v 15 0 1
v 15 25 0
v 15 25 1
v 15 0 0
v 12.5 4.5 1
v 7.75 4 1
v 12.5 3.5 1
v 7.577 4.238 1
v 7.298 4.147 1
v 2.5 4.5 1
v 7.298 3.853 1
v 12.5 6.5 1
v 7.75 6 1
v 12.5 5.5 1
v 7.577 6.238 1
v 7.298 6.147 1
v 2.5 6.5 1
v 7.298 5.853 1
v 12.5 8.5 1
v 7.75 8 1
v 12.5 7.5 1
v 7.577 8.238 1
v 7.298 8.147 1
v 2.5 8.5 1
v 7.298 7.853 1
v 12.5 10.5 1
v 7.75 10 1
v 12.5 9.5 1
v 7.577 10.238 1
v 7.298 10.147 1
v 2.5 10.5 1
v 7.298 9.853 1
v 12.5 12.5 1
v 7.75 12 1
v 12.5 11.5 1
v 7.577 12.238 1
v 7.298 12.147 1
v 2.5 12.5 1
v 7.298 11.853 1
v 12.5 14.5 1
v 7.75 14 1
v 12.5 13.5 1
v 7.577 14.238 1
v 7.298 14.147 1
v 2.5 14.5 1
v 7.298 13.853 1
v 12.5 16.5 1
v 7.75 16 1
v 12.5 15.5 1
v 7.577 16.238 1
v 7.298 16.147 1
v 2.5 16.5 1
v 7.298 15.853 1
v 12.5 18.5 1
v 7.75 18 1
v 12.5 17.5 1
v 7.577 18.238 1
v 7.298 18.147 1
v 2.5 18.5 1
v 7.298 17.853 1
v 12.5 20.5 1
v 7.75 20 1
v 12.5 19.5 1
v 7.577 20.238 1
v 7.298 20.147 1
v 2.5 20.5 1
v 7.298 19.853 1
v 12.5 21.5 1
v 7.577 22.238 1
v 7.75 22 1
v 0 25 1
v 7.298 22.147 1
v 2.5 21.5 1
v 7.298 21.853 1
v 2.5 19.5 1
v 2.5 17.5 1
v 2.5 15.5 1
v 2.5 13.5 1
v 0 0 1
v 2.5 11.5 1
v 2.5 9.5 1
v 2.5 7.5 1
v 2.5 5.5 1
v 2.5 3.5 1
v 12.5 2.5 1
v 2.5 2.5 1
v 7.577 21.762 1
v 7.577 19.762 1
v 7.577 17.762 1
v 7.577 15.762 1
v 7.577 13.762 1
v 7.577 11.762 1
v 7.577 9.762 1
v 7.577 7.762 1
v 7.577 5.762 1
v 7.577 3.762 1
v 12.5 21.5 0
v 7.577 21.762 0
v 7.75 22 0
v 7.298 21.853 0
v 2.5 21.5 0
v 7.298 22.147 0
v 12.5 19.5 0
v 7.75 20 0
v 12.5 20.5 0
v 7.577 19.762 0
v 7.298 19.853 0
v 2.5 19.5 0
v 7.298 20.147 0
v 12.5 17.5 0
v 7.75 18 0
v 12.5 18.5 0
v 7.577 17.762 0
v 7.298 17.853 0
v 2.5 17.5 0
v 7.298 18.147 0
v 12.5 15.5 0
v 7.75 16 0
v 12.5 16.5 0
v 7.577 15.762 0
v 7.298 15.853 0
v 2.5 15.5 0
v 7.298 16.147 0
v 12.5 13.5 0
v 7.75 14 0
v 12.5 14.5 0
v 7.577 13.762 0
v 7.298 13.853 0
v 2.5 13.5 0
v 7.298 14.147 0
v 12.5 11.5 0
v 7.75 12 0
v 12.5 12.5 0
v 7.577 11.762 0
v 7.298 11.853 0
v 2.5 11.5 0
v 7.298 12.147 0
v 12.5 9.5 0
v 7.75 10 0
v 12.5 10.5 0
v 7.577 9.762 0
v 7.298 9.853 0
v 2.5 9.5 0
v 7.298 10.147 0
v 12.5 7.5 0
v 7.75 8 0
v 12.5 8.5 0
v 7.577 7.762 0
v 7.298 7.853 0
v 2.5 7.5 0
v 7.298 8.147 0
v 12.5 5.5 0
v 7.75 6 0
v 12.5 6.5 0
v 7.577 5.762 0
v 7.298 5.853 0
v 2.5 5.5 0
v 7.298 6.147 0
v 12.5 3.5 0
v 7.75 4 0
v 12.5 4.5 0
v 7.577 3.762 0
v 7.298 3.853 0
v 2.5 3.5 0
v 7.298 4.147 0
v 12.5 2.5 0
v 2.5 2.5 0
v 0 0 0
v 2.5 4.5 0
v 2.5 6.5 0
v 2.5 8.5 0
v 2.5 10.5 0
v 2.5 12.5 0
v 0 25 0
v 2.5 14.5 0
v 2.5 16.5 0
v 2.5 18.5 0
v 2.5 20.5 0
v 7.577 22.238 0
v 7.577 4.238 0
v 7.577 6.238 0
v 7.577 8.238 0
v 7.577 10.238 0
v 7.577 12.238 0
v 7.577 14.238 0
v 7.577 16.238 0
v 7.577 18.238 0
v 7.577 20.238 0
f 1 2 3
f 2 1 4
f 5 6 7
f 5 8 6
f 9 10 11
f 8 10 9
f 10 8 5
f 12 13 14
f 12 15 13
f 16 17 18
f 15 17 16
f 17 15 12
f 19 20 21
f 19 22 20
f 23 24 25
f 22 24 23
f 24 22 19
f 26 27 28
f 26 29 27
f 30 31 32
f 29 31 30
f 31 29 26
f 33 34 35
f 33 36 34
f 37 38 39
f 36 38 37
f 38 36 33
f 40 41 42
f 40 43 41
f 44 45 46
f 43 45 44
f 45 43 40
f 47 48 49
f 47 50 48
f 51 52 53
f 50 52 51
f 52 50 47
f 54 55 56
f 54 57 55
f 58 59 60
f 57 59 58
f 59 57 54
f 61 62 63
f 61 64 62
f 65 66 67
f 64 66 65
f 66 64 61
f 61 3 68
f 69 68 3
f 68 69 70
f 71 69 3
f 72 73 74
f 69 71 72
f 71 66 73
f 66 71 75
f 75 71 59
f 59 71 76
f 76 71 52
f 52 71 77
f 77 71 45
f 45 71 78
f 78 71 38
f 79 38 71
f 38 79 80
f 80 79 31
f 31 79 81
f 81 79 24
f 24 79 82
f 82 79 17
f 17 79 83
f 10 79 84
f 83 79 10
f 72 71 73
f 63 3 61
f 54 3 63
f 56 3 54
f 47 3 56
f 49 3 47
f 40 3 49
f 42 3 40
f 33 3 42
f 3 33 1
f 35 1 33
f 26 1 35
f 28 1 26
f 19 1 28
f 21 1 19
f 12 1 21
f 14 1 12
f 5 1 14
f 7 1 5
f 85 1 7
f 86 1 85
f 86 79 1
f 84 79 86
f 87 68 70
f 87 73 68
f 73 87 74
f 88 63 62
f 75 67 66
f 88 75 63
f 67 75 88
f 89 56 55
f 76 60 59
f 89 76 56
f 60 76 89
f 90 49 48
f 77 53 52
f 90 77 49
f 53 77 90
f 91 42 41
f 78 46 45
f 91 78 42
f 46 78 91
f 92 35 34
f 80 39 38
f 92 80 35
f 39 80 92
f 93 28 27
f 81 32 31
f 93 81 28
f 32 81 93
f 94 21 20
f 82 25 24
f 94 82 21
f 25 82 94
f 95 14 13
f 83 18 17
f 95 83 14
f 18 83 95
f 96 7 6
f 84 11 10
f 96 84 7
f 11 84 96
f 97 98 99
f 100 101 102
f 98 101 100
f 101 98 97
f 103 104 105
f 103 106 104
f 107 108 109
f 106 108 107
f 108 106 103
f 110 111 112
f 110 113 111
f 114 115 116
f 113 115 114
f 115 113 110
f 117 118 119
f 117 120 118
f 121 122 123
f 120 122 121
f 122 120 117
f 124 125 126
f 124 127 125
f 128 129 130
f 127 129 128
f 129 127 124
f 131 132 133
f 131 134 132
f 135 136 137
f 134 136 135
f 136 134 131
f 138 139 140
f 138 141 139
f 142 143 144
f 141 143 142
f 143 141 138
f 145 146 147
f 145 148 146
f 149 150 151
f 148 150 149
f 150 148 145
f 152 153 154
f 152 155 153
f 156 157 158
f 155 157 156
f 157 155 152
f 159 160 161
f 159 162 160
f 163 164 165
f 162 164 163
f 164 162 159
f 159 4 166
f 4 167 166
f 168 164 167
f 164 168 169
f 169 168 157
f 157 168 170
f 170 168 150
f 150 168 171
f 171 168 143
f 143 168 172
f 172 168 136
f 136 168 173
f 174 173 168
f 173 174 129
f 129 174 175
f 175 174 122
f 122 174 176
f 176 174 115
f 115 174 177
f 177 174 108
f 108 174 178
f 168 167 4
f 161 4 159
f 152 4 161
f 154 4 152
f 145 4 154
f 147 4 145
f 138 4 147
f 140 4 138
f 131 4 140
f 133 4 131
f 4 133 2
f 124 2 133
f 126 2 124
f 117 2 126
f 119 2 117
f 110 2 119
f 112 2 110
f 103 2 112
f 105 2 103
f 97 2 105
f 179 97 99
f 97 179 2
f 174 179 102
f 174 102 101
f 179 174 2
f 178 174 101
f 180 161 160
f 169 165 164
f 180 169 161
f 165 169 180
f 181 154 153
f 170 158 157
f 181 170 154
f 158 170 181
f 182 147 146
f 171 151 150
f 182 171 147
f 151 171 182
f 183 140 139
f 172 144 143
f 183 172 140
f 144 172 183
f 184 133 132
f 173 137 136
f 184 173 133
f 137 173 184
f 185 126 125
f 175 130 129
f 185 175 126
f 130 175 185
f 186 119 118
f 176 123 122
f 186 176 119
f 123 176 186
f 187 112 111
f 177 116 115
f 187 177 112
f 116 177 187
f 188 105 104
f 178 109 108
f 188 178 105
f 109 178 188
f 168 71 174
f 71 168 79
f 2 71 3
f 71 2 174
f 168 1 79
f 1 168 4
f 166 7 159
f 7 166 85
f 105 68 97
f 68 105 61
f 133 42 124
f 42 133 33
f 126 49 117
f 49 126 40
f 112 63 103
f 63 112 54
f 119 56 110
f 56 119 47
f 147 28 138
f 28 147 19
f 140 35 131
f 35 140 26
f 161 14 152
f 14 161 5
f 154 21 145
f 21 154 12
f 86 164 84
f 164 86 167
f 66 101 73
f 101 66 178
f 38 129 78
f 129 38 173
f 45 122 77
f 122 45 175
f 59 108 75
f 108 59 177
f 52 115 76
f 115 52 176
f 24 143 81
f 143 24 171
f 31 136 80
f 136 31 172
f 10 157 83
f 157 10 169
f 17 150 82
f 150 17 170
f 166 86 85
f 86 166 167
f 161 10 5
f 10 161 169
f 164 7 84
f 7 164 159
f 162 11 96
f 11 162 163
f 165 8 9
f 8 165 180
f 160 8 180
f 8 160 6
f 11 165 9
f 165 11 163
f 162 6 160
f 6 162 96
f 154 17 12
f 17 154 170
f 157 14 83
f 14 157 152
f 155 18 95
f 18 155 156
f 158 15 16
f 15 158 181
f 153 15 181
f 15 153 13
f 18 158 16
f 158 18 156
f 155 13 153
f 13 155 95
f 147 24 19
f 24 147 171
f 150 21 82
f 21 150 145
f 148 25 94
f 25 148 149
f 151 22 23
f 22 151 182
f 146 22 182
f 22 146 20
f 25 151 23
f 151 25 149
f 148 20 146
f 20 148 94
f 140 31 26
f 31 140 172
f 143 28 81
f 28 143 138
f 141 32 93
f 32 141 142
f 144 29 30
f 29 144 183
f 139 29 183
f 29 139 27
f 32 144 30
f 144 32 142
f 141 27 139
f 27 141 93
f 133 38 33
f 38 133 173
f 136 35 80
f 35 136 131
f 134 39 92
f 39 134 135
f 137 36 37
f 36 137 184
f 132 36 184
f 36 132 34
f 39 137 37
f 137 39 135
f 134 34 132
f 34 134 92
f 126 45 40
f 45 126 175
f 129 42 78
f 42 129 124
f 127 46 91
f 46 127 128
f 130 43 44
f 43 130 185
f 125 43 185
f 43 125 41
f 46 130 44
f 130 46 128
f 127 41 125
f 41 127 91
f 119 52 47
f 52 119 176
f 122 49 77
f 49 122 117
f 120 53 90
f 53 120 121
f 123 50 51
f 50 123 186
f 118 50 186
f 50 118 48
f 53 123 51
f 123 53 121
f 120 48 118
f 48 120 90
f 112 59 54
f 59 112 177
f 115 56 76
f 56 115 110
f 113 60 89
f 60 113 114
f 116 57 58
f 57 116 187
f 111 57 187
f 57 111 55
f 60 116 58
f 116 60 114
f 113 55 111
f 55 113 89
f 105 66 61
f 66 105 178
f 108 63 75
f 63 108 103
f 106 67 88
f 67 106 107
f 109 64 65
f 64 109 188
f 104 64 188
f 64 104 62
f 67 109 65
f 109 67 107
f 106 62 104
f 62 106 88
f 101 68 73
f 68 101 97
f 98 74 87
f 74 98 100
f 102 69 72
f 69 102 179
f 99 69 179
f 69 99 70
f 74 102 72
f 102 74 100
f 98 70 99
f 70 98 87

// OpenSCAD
//How many warp threads
warp_count = 20;

//How wide is each thread
warp_diameter = .5;

//How high is the Heddle
heddle_height = 10; 

//2D to make DXF files, 3D for STL
2Dv3D = "3D"; // [2D, 3D]


/* [Hidden] */
warp_dia = warp_diameter; 
weft_dia = warp_dia; 
shaft_width = warp_dia + weft_dia ;
heddle_frame_width = 5*warp_dia;
heddle_frame = heddle_frame_width * 2;
heddle_width = shaft_width  * warp_count;
tt = 0.1;

if (2Dv3D=="2D") {
    projection() heddle();
    }
  else {
    heddle();
    }


module heddle() {
    difference () {  
        cube([heddle_height + heddle_frame, heddle_width + heddle_frame, shaft_width]);
        translate ([heddle_frame_width , heddle_frame_width, -tt/2 ]) 
            cube([heddle_height, heddle_width, shaft_width+tt ]);
        }
    for (I = [ heddle_frame_width + shaft_width : shaft_width *2: heddle_width+heddle_frame - shaft_width  ]) {  
        translate ([0, I, 0]) 
            difference () {
                cube ([heddle_height + heddle_frame, shaft_width, shaft_width] );
                translate ( [(heddle_height + heddle_frame) / 2, shaft_width/2, -tt/2] ) 
                    cylinder ( h=shaft_width+tt, r=warp_dia/2);
                }
            }
        }
